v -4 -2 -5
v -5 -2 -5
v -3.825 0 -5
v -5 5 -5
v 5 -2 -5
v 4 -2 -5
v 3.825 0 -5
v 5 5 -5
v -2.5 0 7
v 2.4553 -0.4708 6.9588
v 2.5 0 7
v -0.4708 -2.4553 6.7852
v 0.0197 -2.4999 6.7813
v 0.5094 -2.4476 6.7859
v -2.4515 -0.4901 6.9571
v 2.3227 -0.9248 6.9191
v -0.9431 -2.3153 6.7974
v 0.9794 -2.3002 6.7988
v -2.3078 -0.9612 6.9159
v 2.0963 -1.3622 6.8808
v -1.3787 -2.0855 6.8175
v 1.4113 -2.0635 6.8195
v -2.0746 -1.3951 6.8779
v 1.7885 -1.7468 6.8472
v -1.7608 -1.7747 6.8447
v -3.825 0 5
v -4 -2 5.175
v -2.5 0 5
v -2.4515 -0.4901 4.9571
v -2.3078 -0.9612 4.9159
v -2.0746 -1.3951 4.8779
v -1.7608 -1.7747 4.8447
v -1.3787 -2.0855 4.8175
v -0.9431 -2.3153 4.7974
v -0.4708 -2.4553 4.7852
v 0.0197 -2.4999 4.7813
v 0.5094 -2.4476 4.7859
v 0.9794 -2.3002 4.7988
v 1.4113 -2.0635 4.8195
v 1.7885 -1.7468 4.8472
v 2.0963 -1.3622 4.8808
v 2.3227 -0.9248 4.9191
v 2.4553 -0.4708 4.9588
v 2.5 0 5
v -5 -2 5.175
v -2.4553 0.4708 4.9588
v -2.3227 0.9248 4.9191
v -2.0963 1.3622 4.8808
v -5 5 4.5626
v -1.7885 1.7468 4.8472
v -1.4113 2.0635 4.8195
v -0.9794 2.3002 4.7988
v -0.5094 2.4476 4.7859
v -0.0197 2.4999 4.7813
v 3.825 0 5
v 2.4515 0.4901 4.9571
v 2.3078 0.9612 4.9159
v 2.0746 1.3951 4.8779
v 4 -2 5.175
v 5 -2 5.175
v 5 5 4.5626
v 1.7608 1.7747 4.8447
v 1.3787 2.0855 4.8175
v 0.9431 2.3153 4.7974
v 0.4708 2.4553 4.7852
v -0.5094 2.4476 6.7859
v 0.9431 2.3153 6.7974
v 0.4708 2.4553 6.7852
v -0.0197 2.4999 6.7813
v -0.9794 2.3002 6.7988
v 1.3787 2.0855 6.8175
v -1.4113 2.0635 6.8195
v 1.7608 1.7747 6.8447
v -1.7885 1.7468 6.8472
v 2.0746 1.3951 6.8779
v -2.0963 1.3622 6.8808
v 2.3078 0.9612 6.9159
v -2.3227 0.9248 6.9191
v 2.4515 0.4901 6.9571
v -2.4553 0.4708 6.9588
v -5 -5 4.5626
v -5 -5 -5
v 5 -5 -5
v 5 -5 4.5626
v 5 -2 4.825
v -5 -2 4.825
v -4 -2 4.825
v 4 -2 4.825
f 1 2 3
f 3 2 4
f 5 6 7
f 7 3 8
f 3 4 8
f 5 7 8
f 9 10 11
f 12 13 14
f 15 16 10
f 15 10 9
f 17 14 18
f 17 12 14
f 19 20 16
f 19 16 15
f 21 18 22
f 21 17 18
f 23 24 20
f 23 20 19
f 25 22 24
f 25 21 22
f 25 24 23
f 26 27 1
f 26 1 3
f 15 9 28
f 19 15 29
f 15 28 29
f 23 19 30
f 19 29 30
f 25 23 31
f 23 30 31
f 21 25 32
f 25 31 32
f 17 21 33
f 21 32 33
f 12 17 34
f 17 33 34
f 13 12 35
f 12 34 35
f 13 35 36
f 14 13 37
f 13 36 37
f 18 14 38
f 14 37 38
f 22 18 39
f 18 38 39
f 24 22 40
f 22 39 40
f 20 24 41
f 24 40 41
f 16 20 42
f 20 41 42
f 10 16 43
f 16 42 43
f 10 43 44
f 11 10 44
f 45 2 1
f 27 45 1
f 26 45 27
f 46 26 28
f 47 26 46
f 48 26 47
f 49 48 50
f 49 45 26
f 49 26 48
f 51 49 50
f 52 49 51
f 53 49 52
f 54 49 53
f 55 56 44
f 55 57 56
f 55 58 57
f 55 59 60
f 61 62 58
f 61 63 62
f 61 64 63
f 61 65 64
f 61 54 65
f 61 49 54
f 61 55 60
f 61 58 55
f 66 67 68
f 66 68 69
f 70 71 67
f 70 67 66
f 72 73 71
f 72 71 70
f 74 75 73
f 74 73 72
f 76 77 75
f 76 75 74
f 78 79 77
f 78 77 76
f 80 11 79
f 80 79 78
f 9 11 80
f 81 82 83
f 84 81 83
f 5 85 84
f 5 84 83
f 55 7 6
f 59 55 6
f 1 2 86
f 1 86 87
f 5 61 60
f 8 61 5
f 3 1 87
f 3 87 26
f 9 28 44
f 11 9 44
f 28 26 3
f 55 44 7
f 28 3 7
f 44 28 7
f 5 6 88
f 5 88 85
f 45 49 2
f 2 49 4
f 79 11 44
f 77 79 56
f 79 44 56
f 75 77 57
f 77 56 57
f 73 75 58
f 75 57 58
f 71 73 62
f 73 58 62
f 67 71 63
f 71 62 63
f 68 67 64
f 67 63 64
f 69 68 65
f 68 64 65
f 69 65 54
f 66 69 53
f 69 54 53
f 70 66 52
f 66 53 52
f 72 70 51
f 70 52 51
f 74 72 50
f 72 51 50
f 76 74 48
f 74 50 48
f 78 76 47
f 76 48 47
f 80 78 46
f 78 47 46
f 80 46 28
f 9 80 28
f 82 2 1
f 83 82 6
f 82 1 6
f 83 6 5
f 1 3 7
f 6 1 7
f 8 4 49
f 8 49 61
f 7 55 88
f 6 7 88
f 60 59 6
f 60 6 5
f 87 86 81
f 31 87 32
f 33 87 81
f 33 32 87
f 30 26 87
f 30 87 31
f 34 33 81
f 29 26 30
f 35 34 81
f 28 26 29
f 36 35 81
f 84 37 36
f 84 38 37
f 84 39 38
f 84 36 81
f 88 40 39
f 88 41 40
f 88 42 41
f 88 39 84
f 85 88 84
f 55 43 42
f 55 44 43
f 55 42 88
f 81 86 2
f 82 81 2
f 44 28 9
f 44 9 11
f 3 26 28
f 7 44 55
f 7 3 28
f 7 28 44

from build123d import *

# Parameters (mm, degrees)
SKIZZE1_W                       = 10
SKIZZE1_H                       = 10
AUFSATZ_LINEAR_AUSTRAGEN1_DEPTH = 5
SKIZZE2_R                       = 2.5
AUFSATZ_LINEAR_AUSTRAGEN2_DEPTH = 2
ABSPALTEN1_SURFACE_1_BACK       = 19.547
ABSPALTEN1_SURFACE_1_DEPTH      = 39.094
ABSPALTEN1_SURFACE_2_BACK       = 19.547
ABSPALTEN1_SURFACE_2_DEPTH      = 39.094
FORMSCHR_GE5_ANGLE              = -5
FORMSCHR_GE6_ANGLE              = -5


with BuildPart() as part:
    # Skizze1 → Aufsatz-Linear austragen1 (new, symmetric)
    with BuildSketch(Plane(origin=(0, 0, 0), x_dir=(1, 0, 0), z_dir=(0, 1, 0))):
        Rectangle(SKIZZE1_W, SKIZZE1_H)
    extrude(amount=AUFSATZ_LINEAR_AUSTRAGEN1_DEPTH, both=True)

    # Skizze2 → Aufsatz-Linear austragen2 (add)
    with BuildSketch(Plane.XY.offset(5)):
        with Locations(Location((0, 0, 0), (0, 0, 180))):
            Circle(SKIZZE2_R)
    extrude(amount=AUFSATZ_LINEAR_AUSTRAGEN2_DEPTH)


with BuildPart() as body_2:
    # Abspalten1: the piece behind the surface
    add(part.part)
    # Abspalten1 surface: a surface, the sketch's curves swept straight by 39.094 mm
    with BuildLine(Plane.XY.offset(5).offset(-ABSPALTEN1_SURFACE_1_BACK), mode=Mode.PRIVATE) as abspalten1_surface_1_path:
        Line((-5, -2), (-4, -2))
        Line((-4, -2), (-3.825022673, 0))
        Line((-3.825022673, 0), (3.825022673, 0))
        Line((3.825022673, 0), (4, -2))
        Line((4, -2), (5, -2))
    abspalten1_surface_1 = Shell.extrude(abspalten1_surface_1_path.wire(), (0 * ABSPALTEN1_SURFACE_1_DEPTH, 0 * ABSPALTEN1_SURFACE_1_DEPTH, 1 * ABSPALTEN1_SURFACE_1_DEPTH))
    split(bisect_by=abspalten1_surface_1, keep=Keep.BOTTOM)

    # Formschräge6
    formschr_ge6_faces = [body_2.faces().sort_by_distance(p)[0] for p in [
        (0, -3.079601476, 5),
        (0, -1.061032954, 7),
    ]]
    draft(formschr_ge6_faces, Plane(origin=(-3.825022673, 0, -5.01), x_dir=(1, 0, 0), z_dir=(0, 1, 0)), FORMSCHR_GE6_ANGLE)


with BuildPart() as part_1:
    add(part.part)

    # Abspalten1: split by a surface, the side it looks to stays
    # Abspalten1 surface: a surface, the sketch's curves swept straight by 39.094 mm
    with BuildLine(Plane.XY.offset(5).offset(-ABSPALTEN1_SURFACE_2_BACK), mode=Mode.PRIVATE) as abspalten1_surface_2_path:
        Line((-5, -2), (-4, -2))
        Line((-4, -2), (-3.825022673, 0))
        Line((-3.825022673, 0), (3.825022673, 0))
        Line((3.825022673, 0), (4, -2))
        Line((4, -2), (5, -2))
    abspalten1_surface_2 = Shell.extrude(abspalten1_surface_2_path.wire(), (0 * ABSPALTEN1_SURFACE_2_DEPTH, 0 * ABSPALTEN1_SURFACE_2_DEPTH, 1 * ABSPALTEN1_SURFACE_2_DEPTH))
    split(bisect_by=abspalten1_surface_2, keep=Keep.TOP)

    # Formschräge5
    formschr_ge5_faces = [part_1.faces().sort_by_distance(p)[0] for p in [
        (0, 1.061032954, 7),
        (4.877934444, 1.5, 5),
    ]]
    draft(formschr_ge5_faces, Plane(origin=(-3.825022673, 0, -5.01), x_dir=(-1, 0, 0), z_dir=(0, -1, 0)), FORMSCHR_GE5_ANGLE)


solid = Compound([body_2.part, part_1.part])
